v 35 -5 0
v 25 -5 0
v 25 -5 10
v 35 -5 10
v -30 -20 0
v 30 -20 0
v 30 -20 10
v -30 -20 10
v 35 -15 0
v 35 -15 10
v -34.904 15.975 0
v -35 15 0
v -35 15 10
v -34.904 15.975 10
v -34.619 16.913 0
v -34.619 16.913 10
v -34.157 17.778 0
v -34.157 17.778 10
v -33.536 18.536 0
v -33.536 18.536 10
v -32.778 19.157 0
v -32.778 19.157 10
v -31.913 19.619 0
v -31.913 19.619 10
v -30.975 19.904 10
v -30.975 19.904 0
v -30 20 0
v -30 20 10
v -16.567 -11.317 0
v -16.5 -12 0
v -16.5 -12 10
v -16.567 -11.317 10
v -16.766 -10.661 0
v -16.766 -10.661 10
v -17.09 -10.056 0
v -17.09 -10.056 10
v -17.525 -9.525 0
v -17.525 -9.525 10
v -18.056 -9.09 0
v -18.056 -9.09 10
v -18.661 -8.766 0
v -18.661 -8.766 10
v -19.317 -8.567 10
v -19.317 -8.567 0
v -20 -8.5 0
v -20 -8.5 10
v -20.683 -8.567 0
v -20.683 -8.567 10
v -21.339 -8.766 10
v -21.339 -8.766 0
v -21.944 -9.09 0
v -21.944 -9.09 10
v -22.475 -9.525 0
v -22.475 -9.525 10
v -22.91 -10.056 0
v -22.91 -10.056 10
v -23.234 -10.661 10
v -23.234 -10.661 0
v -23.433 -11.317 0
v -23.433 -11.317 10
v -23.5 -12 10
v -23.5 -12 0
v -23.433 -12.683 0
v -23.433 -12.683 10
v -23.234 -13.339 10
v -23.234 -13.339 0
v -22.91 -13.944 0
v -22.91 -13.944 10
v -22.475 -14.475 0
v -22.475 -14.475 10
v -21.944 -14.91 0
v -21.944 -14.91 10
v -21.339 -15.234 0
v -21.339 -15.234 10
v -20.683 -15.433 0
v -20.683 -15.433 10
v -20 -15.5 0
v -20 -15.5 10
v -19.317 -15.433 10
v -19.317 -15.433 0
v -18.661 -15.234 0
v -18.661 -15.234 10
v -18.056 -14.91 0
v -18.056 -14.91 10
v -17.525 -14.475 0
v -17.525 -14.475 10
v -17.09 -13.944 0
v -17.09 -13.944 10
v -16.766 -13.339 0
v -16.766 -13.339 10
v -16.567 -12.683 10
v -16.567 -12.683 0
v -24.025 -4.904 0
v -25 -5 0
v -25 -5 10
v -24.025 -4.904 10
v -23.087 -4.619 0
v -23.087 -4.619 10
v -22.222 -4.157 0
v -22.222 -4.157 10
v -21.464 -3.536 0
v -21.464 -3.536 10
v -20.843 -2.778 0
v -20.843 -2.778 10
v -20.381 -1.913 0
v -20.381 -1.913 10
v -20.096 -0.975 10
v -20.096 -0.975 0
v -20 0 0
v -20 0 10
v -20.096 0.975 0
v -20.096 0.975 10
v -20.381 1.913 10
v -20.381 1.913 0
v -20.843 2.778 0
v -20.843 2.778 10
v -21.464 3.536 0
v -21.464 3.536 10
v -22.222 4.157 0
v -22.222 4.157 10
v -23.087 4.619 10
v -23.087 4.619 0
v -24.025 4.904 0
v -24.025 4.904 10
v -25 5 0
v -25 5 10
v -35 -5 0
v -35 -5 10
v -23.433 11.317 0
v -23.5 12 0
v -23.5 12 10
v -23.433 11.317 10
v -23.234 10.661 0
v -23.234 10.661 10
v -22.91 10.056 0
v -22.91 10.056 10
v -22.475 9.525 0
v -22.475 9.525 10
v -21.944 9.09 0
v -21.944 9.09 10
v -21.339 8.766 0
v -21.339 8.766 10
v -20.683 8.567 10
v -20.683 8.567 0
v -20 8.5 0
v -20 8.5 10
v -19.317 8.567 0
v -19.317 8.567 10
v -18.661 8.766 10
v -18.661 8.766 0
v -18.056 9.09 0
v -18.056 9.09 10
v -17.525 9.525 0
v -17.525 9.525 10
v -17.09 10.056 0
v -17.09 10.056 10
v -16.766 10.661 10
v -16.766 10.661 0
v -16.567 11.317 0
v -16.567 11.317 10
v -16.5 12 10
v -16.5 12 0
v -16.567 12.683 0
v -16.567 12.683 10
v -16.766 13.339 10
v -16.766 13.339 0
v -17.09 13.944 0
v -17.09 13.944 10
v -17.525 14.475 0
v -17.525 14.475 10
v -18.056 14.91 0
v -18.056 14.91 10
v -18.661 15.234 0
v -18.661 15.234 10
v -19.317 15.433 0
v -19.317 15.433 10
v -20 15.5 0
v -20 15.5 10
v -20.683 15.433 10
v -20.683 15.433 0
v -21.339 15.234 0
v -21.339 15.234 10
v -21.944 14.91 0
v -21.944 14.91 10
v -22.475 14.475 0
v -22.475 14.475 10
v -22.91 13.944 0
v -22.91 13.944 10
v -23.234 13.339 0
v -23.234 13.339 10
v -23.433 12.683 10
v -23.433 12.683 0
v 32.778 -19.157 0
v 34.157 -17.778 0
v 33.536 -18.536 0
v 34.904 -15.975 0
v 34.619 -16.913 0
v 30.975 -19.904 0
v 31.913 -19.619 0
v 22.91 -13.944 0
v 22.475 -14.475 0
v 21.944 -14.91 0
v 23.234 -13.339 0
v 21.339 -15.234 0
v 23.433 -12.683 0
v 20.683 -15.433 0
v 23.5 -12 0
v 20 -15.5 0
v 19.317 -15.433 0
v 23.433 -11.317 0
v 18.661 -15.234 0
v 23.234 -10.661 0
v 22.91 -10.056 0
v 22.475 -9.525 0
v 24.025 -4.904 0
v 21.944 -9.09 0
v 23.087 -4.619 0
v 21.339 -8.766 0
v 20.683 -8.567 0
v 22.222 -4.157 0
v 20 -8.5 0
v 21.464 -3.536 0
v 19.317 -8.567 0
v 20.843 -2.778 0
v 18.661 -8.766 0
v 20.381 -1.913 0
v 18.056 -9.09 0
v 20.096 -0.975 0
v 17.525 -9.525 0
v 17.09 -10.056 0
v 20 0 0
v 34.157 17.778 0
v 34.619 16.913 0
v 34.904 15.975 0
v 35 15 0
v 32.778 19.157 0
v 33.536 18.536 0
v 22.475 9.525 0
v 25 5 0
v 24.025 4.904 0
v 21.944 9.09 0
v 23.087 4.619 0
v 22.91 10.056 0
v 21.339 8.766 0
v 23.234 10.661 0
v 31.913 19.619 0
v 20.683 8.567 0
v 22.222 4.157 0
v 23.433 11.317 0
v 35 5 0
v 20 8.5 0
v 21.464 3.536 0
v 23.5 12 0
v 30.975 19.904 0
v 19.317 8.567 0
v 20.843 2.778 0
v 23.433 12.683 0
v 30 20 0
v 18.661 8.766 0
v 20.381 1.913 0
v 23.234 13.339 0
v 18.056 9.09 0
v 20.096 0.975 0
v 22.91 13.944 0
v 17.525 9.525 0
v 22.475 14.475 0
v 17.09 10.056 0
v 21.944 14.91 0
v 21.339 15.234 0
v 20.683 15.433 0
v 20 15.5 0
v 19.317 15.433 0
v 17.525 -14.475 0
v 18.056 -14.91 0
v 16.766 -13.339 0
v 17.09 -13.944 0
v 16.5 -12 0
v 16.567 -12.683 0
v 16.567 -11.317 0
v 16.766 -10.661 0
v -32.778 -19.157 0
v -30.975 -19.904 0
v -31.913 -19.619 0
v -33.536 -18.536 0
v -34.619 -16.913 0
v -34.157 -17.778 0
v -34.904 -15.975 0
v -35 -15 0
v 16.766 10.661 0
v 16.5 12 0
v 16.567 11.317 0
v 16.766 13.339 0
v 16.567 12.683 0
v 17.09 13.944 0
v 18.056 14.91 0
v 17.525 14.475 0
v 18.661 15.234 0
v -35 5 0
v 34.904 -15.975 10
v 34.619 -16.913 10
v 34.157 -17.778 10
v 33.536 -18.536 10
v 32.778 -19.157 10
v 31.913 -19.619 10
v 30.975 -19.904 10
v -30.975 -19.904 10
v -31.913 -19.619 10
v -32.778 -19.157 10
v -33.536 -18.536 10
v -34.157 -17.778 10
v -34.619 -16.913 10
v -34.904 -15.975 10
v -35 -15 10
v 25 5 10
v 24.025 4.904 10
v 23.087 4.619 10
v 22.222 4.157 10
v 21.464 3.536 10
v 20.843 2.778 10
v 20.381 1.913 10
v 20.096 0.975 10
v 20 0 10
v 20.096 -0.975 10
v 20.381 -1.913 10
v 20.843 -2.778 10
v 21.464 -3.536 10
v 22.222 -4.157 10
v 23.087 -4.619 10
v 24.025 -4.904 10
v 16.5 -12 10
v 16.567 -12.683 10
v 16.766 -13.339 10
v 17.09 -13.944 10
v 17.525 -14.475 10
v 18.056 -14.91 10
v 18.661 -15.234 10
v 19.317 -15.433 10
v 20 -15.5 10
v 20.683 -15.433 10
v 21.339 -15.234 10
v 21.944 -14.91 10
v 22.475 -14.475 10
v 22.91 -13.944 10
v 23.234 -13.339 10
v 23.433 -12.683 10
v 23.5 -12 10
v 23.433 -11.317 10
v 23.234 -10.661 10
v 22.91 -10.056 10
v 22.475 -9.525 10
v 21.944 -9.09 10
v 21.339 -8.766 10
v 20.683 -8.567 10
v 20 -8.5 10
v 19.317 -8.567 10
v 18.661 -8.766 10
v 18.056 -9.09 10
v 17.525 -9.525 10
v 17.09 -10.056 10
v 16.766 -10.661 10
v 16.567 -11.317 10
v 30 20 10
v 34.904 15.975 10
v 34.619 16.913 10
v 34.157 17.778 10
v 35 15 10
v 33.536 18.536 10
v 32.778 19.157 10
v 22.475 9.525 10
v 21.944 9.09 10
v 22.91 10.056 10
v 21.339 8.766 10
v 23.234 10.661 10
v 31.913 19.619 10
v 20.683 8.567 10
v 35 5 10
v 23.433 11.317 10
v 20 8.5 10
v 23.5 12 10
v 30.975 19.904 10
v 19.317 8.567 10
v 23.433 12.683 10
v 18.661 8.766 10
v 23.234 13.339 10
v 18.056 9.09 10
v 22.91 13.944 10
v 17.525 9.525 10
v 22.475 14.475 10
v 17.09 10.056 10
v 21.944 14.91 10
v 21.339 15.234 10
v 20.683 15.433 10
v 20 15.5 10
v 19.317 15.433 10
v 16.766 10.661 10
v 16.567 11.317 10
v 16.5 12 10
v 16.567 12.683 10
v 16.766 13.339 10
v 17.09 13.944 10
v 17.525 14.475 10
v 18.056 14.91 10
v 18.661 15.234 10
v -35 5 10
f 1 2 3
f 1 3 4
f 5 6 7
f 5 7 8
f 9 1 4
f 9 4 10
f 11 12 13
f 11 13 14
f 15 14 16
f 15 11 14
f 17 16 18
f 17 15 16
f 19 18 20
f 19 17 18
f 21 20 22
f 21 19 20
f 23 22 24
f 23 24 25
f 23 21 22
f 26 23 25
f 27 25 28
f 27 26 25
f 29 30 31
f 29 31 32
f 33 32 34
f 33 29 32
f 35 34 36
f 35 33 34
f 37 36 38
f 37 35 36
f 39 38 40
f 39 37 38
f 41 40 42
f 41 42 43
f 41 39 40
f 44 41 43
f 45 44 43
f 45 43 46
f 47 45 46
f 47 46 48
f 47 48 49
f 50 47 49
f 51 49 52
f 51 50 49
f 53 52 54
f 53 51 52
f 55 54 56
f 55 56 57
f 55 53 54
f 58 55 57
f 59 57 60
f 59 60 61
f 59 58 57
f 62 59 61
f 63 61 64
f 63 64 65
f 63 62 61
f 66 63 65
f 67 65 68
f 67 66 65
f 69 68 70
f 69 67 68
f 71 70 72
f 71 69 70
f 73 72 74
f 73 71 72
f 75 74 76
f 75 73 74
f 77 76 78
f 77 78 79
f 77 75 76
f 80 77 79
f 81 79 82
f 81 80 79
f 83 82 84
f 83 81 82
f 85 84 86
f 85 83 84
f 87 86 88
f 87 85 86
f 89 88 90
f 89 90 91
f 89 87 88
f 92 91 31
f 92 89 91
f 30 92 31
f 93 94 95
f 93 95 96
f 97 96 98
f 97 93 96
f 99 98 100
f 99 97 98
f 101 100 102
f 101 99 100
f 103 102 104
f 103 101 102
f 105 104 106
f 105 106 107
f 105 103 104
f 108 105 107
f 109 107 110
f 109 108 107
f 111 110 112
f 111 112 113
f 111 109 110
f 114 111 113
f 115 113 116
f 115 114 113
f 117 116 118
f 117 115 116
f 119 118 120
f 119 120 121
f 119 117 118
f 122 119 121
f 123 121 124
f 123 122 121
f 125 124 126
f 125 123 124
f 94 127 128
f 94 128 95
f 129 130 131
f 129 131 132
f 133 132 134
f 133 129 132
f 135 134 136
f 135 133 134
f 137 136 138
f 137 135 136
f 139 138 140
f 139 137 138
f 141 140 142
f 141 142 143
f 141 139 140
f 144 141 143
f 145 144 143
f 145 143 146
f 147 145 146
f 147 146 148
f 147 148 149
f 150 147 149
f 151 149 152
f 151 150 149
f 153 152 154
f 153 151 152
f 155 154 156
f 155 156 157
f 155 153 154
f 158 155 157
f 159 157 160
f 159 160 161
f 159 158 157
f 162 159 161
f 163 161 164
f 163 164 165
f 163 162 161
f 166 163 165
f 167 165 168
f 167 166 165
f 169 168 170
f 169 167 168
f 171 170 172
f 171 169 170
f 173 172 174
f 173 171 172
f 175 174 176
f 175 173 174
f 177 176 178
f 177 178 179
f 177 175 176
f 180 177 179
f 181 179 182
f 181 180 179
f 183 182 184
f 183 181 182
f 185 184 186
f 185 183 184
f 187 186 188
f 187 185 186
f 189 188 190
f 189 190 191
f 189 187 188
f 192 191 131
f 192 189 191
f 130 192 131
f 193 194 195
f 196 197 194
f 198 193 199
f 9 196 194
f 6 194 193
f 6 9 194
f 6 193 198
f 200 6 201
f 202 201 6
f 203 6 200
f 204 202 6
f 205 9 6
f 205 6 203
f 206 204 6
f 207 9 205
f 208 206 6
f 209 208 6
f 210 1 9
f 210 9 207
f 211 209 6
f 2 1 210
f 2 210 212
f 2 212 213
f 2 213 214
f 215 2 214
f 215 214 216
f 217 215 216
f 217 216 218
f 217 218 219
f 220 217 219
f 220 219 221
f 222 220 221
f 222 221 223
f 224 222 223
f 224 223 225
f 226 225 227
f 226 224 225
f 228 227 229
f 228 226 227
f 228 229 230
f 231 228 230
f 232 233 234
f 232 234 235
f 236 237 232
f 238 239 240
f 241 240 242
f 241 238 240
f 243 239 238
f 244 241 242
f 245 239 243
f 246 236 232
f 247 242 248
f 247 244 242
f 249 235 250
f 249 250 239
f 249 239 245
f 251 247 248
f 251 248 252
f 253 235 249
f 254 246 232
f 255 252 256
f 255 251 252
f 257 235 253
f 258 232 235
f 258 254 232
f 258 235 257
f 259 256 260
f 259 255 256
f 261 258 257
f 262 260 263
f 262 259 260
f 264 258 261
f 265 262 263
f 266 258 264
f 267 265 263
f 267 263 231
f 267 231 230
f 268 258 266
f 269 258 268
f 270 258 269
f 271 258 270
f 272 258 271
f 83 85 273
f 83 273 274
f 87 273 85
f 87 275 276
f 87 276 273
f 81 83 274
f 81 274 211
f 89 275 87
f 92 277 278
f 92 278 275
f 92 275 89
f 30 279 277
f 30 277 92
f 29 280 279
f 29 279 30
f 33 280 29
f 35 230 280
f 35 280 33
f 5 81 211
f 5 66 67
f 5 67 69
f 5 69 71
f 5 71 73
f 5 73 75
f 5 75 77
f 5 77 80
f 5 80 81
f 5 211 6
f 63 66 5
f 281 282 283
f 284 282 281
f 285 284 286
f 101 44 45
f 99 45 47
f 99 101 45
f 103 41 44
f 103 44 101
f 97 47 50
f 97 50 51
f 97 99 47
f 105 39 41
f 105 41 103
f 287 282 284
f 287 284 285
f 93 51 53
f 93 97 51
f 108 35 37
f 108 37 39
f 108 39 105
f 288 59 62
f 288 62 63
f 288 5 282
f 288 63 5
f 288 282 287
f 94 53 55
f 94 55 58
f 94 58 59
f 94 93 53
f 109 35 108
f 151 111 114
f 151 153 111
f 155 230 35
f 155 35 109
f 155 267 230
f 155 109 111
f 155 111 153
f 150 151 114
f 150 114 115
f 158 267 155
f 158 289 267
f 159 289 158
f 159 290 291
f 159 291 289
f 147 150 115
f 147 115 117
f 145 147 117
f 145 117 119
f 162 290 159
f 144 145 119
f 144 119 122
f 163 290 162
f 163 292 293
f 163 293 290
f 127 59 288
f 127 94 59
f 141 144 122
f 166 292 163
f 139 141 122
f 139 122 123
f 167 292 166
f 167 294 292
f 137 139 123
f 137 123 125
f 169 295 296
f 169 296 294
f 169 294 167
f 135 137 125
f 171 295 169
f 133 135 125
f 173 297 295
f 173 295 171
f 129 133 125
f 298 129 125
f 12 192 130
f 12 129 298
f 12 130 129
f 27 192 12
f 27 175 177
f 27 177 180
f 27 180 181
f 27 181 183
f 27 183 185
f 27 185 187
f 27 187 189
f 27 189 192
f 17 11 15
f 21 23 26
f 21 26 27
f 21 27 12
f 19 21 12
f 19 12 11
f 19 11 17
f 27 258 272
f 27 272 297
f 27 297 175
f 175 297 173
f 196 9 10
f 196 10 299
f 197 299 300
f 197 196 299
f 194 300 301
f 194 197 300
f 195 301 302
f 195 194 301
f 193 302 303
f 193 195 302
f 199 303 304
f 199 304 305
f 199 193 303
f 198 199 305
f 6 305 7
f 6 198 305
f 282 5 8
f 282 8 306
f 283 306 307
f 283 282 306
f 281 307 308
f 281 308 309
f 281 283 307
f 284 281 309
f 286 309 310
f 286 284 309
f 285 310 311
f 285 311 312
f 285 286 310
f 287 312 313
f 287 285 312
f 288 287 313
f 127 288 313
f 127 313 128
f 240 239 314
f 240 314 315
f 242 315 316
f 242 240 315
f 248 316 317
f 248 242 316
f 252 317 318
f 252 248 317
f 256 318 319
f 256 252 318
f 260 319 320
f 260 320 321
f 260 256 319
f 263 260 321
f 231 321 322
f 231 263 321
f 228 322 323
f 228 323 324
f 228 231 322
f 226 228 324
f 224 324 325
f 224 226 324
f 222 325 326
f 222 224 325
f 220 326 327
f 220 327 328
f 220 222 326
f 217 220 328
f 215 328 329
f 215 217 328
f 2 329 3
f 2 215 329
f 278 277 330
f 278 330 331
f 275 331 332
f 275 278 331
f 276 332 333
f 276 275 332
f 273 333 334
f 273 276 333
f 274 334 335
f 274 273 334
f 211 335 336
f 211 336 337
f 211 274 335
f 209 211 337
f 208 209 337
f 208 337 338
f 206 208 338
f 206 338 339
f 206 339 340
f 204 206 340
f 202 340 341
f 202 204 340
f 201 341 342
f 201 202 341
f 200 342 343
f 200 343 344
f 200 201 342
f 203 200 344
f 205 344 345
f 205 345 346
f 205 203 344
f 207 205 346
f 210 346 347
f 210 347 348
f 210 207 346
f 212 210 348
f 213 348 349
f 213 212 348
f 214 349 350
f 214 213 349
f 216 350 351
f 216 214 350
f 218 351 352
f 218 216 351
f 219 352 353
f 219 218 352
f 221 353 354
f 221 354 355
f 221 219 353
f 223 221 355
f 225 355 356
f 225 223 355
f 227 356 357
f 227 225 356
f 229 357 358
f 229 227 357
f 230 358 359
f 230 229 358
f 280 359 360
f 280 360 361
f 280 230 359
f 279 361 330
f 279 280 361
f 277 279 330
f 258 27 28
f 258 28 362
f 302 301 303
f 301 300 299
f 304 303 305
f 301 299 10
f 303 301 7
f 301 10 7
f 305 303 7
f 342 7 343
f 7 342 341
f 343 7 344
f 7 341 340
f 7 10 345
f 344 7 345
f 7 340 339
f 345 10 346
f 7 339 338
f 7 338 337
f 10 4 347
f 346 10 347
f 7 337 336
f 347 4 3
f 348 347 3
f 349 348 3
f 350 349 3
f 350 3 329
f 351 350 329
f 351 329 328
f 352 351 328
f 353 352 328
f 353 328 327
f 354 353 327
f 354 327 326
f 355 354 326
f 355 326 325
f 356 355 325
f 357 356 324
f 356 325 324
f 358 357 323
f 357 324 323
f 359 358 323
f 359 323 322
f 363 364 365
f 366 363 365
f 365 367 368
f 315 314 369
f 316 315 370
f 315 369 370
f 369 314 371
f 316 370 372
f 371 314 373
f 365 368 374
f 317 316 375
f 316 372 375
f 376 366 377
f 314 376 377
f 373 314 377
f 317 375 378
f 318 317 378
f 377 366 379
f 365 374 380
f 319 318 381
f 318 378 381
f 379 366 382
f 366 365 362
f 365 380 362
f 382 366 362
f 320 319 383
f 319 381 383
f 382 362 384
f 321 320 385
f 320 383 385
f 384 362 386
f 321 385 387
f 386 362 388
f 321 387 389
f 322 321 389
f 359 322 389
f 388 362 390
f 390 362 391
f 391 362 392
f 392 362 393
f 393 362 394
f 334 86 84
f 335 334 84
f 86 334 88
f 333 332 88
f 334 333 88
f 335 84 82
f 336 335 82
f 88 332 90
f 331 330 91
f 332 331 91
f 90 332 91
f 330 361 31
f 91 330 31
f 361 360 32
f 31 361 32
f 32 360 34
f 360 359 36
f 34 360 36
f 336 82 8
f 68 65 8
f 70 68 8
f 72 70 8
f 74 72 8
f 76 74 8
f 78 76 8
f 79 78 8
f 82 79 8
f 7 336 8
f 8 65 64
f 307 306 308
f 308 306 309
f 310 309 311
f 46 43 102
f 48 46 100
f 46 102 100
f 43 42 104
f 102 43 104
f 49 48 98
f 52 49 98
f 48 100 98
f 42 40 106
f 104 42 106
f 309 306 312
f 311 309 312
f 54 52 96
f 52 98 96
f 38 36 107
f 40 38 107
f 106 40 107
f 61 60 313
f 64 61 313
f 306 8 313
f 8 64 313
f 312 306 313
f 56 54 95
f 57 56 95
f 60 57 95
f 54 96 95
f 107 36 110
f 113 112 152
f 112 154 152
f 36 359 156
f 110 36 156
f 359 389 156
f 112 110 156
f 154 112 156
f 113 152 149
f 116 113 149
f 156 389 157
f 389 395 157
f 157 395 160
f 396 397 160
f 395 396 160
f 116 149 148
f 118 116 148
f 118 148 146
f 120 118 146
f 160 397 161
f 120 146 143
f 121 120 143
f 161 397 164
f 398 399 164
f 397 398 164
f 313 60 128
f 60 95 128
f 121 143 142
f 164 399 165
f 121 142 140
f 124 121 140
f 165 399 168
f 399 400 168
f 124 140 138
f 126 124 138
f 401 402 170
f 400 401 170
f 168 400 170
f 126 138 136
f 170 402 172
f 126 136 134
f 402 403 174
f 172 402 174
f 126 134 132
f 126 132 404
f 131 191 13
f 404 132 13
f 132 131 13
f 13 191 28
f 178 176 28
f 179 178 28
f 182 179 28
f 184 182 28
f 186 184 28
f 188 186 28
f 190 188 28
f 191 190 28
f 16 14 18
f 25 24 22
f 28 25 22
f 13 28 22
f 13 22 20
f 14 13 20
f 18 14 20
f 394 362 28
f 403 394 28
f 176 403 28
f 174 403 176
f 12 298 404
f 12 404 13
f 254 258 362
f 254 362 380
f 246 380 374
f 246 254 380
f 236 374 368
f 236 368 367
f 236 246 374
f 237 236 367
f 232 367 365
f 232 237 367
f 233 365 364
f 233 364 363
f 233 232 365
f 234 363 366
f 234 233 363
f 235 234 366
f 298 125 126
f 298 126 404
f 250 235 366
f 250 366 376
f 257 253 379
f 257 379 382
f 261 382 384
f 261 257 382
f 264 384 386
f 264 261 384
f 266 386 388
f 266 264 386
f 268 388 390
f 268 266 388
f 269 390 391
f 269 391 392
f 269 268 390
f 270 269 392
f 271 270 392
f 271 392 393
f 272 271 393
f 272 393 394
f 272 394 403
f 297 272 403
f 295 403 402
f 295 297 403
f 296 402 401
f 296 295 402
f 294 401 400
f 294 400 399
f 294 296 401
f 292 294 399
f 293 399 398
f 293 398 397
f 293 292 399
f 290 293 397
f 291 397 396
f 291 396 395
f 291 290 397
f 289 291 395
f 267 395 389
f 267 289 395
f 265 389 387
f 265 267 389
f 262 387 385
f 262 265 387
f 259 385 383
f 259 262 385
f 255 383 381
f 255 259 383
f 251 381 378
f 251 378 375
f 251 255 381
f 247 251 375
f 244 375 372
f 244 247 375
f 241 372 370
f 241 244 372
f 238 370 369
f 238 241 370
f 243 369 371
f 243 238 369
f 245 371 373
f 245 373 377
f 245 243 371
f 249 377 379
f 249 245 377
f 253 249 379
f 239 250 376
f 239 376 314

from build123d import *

# Parameters (mm, degrees)
CROQUIS1_R              = 3.5
SALIENTE_EXTRUIR2_DEPTH = 10


with BuildPart() as part:
    # Croquis1 → Saliente-Extruir2 (new body)
    with BuildSketch(Plane.XY):
        with BuildLine():
            Line((-30, 20), (30, 20))
            ThreePointArc((30, 20), (33.535533906, 18.535533906), (35, 15))
            Line((35, 15), (35, 5))
            Line((35, 5), (25, 5))
            ThreePointArc((25, 5), (20, 0), (25, -5))
            Line((25, -5), (35, -5))
            Line((35, -5), (35, -15))
            ThreePointArc((35, -15), (33.535533906, -18.535533906), (30, -20))
            Line((30, -20), (-30, -20))
            ThreePointArc((-30, -20), (-33.535533906, -18.535533906), (-35, -15))
            Line((-35, -15), (-35, -5))
            Line((-35, -5), (-25, -5))
            ThreePointArc((-25, -5), (-20, 0), (-25, 5))
            Line((-25, 5), (-35, 5))
            Line((-35, 5), (-35, 15))
            ThreePointArc((-35, 15), (-33.535533906, 18.535533906), (-30, 20))
        make_face()
        with Locations((20, 12)):
            Circle(CROQUIS1_R, mode=Mode.SUBTRACT)
        with Locations(Location((20, -12, 0), (0, 0, 180))):
            Circle(CROQUIS1_R, mode=Mode.SUBTRACT)
        with Locations((-20, -12)):
            Circle(CROQUIS1_R, mode=Mode.SUBTRACT)
        with Locations(Location((-20, 12, 0), (0, 0, 180))):
            Circle(CROQUIS1_R, mode=Mode.SUBTRACT)
    extrude(amount=SALIENTE_EXTRUIR2_DEPTH)


solid = part.part
